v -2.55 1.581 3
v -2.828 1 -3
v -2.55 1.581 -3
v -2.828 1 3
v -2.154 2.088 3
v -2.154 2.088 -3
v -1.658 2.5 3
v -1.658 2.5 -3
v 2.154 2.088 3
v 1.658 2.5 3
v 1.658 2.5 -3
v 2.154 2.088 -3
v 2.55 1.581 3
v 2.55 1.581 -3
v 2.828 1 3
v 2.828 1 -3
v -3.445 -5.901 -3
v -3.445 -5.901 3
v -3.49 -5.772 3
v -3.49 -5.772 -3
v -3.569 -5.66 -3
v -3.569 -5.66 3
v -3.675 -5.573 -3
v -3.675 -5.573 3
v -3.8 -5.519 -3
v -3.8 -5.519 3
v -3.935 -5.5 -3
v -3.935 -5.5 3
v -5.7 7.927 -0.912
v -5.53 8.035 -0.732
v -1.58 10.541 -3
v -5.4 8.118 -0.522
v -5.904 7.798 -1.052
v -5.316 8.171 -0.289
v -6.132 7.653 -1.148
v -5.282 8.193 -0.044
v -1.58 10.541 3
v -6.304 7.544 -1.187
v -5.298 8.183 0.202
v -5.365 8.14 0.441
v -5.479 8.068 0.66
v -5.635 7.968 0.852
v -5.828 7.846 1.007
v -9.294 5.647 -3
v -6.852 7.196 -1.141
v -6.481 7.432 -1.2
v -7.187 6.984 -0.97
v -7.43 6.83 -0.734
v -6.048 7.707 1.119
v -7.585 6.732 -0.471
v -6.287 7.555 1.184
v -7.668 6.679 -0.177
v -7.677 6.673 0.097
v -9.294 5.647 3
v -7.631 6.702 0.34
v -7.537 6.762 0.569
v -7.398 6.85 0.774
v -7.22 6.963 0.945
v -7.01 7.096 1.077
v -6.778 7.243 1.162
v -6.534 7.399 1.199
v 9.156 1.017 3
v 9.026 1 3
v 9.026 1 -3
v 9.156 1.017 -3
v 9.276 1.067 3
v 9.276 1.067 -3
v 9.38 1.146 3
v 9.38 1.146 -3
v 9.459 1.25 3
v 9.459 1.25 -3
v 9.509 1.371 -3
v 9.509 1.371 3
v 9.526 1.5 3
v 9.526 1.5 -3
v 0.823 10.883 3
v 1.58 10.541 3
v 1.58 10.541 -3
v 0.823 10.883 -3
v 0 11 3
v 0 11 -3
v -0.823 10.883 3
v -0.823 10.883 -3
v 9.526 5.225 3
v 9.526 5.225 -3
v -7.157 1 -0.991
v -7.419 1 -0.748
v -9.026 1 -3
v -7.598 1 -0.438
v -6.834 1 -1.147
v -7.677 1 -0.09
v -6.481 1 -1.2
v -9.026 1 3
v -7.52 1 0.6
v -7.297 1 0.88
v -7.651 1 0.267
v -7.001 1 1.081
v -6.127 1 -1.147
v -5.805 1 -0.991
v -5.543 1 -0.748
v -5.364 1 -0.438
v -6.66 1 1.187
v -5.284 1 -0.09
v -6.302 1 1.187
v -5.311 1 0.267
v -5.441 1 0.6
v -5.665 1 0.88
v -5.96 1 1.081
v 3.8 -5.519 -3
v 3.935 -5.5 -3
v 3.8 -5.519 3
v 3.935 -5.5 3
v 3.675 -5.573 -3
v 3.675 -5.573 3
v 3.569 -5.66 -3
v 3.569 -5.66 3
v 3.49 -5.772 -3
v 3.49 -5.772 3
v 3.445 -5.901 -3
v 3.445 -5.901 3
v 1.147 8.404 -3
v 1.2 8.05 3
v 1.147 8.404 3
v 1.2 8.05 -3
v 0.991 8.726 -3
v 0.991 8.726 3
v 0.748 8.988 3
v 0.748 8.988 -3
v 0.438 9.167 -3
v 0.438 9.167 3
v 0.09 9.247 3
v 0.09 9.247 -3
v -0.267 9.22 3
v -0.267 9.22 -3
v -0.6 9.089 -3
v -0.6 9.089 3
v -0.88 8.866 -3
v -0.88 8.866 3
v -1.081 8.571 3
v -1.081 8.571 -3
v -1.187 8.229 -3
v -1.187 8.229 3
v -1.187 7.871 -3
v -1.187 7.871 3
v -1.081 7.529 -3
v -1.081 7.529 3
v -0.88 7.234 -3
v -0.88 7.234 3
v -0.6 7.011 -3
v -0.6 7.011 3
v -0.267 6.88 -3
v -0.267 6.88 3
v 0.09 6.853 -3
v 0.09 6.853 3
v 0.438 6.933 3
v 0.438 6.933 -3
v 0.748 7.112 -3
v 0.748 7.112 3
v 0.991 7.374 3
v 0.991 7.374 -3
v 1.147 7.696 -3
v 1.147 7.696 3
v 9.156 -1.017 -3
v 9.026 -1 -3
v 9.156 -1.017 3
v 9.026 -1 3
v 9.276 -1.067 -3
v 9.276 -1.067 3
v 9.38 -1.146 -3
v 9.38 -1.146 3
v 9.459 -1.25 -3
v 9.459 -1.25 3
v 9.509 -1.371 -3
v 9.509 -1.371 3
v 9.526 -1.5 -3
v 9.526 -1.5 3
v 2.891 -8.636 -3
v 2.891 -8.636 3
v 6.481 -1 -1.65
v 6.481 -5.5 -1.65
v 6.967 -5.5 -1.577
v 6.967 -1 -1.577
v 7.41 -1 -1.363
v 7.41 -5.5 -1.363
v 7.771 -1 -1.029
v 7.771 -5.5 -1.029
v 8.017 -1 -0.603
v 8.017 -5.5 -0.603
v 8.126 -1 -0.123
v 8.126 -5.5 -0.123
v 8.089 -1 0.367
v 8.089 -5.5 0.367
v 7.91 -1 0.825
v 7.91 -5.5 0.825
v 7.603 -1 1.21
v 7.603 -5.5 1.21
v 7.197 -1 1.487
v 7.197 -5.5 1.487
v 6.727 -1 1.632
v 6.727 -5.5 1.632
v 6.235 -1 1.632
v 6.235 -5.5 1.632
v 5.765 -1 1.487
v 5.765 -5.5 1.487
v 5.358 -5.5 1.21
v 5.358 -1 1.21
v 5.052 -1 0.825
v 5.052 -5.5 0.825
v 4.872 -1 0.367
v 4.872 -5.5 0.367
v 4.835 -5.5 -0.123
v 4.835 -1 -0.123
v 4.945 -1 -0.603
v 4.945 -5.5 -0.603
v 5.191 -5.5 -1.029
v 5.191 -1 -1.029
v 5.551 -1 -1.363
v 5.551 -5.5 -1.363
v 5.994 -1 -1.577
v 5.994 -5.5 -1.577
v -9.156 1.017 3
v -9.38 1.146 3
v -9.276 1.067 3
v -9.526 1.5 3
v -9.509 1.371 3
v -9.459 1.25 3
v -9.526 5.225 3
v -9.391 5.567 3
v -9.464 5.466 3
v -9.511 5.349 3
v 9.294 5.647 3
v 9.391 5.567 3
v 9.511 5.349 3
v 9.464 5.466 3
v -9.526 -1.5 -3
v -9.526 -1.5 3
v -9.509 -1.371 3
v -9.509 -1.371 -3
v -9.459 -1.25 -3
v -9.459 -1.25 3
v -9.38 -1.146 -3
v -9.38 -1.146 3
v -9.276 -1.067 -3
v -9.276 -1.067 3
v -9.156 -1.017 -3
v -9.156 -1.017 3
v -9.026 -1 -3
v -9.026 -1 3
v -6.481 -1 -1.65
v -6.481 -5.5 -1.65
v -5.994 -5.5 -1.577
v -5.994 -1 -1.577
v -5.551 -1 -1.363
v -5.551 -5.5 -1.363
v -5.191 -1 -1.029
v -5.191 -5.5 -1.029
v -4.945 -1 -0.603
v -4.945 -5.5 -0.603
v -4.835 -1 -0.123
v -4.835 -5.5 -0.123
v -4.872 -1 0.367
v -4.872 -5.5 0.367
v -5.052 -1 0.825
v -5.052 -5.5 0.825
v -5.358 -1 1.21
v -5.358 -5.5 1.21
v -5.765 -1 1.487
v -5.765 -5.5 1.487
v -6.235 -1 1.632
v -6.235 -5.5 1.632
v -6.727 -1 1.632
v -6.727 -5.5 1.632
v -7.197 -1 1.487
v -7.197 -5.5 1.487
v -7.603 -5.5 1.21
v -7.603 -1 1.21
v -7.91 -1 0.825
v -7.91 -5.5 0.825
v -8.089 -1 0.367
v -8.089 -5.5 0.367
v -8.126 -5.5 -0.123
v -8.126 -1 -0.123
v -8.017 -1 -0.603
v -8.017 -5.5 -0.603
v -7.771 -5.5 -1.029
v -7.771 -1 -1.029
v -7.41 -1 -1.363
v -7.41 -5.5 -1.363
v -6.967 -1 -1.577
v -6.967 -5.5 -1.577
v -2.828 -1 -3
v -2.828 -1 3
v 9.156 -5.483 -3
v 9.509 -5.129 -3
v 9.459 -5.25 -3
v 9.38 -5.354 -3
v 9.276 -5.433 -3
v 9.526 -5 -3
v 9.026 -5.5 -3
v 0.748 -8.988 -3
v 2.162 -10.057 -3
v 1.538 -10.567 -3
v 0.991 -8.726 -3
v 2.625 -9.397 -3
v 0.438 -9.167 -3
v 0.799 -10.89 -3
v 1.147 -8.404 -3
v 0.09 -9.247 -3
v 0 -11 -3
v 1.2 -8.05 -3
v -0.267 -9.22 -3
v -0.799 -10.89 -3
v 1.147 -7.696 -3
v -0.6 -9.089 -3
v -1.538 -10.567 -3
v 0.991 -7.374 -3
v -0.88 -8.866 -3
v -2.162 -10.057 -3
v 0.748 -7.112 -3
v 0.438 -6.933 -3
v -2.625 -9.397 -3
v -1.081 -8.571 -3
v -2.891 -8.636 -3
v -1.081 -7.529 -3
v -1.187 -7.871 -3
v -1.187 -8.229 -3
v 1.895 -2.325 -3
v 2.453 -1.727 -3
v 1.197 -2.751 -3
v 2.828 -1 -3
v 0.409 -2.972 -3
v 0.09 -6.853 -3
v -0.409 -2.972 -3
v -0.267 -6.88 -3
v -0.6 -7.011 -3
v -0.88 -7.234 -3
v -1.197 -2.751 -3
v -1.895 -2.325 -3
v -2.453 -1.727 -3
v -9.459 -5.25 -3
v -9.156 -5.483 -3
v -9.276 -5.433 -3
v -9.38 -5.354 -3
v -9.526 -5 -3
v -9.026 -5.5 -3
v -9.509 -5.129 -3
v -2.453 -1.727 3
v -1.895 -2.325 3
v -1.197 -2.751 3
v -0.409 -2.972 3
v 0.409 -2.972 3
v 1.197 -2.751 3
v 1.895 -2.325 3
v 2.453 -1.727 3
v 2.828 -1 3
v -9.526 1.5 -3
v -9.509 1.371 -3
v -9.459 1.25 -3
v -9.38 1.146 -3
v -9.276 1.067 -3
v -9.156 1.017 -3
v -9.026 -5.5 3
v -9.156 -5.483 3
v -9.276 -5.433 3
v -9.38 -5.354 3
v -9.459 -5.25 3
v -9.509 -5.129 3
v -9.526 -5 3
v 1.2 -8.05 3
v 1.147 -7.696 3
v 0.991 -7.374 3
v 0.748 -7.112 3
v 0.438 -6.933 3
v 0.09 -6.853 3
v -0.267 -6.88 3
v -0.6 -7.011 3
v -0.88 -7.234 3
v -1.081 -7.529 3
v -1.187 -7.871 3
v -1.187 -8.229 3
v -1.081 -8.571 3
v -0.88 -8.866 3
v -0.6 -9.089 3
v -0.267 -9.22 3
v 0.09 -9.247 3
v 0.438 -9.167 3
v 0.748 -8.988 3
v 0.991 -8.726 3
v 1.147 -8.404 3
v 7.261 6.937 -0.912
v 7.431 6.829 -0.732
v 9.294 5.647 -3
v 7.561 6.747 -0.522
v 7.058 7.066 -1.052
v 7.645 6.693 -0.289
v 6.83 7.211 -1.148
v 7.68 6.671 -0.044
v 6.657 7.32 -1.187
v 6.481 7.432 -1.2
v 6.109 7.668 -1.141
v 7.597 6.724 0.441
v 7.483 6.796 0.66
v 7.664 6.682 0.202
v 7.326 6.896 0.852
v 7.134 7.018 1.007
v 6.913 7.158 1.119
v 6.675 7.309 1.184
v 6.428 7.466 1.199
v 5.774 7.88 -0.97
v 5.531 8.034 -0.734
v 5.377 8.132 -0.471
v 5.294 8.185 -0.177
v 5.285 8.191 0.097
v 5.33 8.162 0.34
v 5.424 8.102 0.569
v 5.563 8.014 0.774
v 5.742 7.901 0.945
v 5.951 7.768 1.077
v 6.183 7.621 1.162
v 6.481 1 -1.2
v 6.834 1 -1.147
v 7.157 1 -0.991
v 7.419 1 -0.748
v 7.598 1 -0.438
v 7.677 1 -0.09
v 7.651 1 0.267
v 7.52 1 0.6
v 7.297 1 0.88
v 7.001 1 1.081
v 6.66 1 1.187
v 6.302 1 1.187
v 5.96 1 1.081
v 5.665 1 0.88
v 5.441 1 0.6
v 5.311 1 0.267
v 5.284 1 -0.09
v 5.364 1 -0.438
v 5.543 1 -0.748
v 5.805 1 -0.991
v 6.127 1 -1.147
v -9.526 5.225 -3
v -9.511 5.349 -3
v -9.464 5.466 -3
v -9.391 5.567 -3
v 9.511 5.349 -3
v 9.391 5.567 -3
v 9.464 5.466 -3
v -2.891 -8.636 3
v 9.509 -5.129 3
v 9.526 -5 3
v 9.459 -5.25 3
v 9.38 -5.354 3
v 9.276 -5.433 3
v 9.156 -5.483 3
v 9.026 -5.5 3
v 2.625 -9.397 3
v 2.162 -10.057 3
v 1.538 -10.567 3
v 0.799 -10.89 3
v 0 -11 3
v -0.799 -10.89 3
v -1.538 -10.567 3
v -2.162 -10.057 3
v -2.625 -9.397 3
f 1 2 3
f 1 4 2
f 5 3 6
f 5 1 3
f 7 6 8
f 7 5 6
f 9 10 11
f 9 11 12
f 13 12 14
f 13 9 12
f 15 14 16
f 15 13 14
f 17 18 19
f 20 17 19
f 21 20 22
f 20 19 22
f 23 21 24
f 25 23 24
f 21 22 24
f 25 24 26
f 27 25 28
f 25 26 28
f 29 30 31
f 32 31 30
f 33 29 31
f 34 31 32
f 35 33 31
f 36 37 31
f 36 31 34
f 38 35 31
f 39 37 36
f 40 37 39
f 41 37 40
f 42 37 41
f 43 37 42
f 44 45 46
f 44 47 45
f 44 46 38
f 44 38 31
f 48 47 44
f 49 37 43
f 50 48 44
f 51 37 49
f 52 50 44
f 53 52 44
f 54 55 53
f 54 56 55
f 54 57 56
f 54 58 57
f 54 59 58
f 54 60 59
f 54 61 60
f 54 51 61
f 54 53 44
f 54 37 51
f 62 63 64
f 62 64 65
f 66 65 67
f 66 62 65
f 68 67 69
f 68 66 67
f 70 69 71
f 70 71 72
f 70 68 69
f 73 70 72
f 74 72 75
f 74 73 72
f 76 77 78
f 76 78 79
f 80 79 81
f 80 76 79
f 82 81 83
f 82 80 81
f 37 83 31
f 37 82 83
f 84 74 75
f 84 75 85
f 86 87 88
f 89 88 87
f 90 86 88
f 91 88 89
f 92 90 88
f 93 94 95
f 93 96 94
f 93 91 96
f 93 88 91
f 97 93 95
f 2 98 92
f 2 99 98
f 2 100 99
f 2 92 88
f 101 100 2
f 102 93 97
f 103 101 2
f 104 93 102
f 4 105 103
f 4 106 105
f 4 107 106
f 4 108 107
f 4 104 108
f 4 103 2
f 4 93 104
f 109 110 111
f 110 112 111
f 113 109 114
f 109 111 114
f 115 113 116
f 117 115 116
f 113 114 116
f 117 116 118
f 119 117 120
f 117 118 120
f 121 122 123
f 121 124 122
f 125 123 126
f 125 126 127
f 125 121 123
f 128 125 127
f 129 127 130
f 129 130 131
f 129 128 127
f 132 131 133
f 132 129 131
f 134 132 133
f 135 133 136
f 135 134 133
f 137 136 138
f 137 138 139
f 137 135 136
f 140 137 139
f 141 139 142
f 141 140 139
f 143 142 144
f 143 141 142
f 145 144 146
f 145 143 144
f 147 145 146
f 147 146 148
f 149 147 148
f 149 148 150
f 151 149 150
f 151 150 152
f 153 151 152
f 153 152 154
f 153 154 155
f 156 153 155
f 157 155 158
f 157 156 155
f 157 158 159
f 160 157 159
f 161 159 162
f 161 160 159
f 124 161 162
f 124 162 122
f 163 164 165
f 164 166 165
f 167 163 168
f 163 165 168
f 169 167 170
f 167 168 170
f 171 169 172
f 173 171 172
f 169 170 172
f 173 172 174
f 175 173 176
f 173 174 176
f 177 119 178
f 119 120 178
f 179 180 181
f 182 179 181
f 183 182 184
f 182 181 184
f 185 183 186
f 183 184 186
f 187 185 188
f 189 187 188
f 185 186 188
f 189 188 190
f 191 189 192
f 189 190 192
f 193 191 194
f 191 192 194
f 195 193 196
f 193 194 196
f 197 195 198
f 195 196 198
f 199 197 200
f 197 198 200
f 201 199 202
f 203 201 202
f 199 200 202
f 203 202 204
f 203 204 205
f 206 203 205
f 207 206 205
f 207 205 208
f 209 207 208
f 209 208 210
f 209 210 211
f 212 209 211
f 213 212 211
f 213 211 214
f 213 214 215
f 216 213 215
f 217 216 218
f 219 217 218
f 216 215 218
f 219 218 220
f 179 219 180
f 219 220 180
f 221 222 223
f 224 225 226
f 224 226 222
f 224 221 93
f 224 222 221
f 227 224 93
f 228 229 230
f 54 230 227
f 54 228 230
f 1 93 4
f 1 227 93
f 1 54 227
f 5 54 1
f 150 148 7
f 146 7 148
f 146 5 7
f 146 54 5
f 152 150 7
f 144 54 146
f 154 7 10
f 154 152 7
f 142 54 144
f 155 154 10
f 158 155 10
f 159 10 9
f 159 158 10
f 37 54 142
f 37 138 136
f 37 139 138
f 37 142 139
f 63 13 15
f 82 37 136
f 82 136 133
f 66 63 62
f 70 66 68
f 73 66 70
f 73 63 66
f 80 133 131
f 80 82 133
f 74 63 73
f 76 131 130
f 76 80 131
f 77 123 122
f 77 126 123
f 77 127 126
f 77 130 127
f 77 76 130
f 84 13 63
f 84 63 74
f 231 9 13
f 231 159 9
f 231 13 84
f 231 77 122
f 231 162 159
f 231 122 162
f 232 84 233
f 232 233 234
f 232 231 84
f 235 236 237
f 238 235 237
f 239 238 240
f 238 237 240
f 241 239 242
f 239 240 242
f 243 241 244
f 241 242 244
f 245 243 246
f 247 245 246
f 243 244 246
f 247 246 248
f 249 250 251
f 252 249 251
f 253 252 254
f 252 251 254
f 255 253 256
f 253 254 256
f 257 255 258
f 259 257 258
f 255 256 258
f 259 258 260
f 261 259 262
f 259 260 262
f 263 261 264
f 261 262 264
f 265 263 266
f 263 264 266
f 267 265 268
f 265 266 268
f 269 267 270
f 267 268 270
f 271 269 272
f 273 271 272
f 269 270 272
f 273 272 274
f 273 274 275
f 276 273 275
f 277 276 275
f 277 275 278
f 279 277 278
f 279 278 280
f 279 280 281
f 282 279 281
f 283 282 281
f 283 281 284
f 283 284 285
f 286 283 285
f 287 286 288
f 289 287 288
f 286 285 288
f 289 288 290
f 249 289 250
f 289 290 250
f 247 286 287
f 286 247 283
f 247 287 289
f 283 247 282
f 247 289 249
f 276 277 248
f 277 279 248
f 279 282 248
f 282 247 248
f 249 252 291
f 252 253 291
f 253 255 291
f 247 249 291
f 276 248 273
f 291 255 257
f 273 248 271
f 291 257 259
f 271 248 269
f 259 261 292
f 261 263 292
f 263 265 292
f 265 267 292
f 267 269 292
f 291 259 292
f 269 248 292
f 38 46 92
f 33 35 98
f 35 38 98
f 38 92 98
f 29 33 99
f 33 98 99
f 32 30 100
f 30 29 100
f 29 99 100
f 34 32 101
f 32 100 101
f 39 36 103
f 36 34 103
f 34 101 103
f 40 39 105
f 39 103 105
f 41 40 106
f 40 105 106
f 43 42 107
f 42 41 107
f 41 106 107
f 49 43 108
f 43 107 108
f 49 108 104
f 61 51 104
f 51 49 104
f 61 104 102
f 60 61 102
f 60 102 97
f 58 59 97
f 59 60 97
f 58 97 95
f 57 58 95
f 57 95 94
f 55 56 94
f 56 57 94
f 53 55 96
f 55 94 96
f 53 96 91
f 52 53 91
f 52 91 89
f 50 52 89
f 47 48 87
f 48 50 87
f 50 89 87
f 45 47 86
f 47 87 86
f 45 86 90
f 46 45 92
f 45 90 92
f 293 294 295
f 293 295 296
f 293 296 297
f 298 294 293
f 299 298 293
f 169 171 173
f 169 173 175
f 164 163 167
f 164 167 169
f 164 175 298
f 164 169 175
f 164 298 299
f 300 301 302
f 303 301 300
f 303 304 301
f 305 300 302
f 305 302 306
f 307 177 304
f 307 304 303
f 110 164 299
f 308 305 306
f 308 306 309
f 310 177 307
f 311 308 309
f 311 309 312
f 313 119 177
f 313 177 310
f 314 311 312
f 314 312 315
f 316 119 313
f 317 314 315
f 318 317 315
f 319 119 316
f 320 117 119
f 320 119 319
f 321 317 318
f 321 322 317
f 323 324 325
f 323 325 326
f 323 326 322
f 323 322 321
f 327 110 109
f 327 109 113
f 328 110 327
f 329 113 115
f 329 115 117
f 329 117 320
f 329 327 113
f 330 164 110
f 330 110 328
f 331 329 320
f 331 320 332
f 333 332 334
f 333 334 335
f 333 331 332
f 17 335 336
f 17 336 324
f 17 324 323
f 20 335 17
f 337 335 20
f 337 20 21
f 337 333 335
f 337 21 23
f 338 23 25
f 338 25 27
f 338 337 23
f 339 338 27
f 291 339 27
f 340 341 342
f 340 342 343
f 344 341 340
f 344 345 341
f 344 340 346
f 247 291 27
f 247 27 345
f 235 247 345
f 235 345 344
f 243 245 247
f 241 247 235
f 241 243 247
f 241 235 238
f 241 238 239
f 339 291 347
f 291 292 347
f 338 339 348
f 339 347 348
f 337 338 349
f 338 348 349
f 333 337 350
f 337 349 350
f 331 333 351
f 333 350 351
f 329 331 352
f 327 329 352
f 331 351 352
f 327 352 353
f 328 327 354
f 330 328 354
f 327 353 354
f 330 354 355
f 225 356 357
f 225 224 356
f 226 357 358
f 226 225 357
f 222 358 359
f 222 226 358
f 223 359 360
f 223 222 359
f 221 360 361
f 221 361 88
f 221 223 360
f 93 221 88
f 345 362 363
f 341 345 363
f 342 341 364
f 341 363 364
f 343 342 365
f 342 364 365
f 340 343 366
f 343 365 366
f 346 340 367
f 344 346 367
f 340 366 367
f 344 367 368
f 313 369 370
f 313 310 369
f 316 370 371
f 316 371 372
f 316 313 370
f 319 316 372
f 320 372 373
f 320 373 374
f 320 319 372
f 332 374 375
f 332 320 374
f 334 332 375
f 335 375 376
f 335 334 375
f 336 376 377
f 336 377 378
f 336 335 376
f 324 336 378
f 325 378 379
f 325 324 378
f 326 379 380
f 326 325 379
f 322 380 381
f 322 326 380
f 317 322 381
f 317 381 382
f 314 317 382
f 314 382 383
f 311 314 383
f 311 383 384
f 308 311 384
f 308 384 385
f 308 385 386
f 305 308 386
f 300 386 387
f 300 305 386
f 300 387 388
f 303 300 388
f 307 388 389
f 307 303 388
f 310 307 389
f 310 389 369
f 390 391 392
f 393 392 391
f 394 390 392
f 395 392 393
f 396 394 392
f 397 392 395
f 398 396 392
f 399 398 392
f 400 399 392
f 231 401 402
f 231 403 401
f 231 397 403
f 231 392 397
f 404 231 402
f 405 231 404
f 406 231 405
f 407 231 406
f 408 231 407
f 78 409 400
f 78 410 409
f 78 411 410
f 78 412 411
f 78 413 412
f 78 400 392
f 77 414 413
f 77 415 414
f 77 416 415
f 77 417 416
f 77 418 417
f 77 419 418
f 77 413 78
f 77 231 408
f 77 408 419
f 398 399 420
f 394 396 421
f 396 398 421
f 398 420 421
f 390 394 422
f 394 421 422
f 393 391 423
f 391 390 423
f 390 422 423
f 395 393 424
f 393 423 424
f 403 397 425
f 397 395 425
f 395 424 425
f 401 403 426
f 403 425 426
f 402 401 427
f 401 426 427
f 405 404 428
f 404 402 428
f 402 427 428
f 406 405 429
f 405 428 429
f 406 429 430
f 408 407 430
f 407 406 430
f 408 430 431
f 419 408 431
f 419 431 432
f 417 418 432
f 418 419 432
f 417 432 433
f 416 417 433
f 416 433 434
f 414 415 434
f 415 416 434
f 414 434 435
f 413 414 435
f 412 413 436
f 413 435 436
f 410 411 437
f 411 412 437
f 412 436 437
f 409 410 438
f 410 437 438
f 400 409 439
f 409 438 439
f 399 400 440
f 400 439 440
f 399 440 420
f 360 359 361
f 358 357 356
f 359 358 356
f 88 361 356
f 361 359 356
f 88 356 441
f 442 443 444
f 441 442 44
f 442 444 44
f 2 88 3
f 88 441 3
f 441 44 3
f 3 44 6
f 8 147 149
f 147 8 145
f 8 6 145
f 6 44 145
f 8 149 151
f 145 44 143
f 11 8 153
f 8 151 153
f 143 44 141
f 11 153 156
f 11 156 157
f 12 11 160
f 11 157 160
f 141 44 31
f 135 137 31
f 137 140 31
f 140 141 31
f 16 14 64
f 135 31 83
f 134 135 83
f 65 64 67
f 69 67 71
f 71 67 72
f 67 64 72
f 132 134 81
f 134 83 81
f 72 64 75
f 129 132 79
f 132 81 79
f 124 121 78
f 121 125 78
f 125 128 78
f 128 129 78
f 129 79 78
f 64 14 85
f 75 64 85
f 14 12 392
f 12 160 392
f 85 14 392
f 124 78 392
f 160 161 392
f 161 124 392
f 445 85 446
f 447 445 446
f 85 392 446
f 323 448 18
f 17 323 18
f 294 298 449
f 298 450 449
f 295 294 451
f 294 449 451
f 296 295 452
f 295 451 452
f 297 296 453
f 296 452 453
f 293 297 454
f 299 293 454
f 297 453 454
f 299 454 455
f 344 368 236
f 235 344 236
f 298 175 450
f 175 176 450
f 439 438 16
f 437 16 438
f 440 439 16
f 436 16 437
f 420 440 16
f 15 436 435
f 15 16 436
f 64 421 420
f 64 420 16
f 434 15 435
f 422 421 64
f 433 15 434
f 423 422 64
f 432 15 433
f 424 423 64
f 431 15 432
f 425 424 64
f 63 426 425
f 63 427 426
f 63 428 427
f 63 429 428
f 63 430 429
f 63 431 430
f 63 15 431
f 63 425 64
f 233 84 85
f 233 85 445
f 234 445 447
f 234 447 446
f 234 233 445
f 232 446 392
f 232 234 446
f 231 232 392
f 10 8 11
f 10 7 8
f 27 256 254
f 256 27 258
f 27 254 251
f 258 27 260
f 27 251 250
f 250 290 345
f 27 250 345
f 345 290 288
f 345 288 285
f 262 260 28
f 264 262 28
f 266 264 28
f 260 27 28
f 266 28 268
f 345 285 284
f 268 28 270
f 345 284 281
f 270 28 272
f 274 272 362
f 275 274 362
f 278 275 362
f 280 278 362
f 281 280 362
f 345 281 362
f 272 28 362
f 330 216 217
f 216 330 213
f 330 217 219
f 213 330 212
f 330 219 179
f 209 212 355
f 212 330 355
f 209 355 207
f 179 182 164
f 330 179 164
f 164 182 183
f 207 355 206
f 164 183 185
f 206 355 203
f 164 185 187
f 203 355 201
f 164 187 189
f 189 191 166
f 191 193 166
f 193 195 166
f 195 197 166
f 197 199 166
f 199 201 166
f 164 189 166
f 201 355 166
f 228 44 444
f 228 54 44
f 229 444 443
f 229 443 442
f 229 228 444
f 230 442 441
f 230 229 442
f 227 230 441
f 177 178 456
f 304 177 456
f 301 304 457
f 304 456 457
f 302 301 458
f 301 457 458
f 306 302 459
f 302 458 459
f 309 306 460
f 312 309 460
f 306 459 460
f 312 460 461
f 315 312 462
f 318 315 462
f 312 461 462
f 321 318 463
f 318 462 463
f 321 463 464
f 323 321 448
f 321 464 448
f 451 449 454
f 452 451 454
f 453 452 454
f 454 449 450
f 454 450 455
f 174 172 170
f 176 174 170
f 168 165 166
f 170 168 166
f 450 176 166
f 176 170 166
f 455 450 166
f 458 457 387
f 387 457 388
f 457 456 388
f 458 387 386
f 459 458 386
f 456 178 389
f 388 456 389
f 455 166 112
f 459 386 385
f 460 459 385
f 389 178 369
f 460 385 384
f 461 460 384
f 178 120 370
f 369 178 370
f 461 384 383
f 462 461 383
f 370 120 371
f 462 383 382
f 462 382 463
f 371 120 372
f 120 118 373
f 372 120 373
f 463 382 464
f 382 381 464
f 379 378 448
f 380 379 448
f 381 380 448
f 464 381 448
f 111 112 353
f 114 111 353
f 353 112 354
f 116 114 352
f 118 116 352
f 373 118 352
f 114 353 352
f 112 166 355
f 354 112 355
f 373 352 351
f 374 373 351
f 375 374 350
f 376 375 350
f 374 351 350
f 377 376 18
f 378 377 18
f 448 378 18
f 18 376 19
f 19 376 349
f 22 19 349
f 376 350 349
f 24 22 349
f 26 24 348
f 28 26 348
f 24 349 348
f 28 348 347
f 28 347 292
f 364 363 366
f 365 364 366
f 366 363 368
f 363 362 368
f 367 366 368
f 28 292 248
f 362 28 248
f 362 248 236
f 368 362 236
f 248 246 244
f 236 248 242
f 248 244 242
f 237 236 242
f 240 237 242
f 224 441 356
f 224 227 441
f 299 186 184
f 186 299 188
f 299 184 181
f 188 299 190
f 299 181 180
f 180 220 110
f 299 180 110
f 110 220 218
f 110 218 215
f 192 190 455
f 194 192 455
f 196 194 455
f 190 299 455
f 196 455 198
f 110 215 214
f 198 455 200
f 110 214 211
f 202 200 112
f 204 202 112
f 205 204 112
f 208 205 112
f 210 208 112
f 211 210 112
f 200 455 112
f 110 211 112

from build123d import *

# Parameters (mm, degrees)
SKETCH_1_R          = 1.2
EXTRUDE_1_DEPTH     = 3
EXTRUDE_1_2_DEPTH   = 3
SKETCH_2_R          = 1.2
CUT_EXTRUDE_1_DEPTH = 20.287301522
SKETCH_3_R          = 1.65
CUT_EXTRUDE_2_DEPTH = 4.5


with BuildPart() as part:
    # 草图1 → 凸台-拉伸1 (new, symmetric)
    with BuildSketch(Plane.XY):
        with BuildLine():
            Line((-1.658312395, 2.5), (1.658312395, 2.5))
            ThreePointArc((1.658312395, 2.5), (2.365419176, 1.84520788), (2.828427125, 1))
            Line((2.828427125, 1), (9.026279442, 1))
            ThreePointArc((9.026279442, 1), (9.379832832, 1.146446609), (9.526279442, 1.5))
            Line((9.526279442, 1.5), (9.526279442, 5.22507425))
            ThreePointArc((9.526279442, 5.22507425), (9.464414867, 5.465983671), (9.294130046, 5.647278056))
            Line((9.294130046, 5.647278056), (1.580318565, 10.541002455))
            ThreePointArc((1.580318565, 10.541002455), (0, 11), (-1.580318565, 10.541002455))
            Line((-1.580318565, 10.541002455), (-9.294130046, 5.647278056))
            ThreePointArc((-9.294130046, 5.647278056), (-9.464414867, 5.465983671), (-9.526279442, 5.22507425))
            Line((-9.526279442, 5.22507425), (-9.526279442, 1.5))
            ThreePointArc((-9.526279442, 1.5), (-9.379832832, 1.146446609), (-9.026279442, 1))
            Line((-9.026279442, 1), (-2.828427125, 1))
            ThreePointArc((-2.828427125, 1), (-2.365419176, 1.84520788), (-1.658312395, 2.5))
        make_face()
        with Locations((0, 8.05)):
            Circle(SKETCH_1_R, mode=Mode.SUBTRACT)
    extrude(amount=EXTRUDE_1_DEPTH, both=True)


with BuildPart() as body_2:
    # 草图1 → Extrude 1 2 (new, symmetric)
    with BuildSketch(Plane.XY):
        with BuildLine():
            Line((-9.026279442, -1), (-2.828427125, -1))
            ThreePointArc((-2.828427125, -1), (0, -3), (2.828427125, -1))
            Line((2.828427125, -1), (9.026279442, -1))
            ThreePointArc((9.026279442, -1), (9.379832832, -1.146446609), (9.526279442, -1.5))
            Line((9.526279442, -1.5), (9.526279442, -5))
            ThreePointArc((9.526279442, -5), (9.379832832, -5.353553391), (9.026279442, -5.5))
            Line((9.026279442, -5.5), (3.935174447, -5.5))
            ThreePointArc((3.935174447, -5.5), (3.6186464, -5.612947037), (3.445121974, -5.900760016))
            Line((3.445121974, -5.900760016), (2.891309587, -8.635515904))
            ThreePointArc((2.891309587, -8.635515904), (0, -11), (-2.891309587, -8.635515904))
            Line((-2.891309587, -8.635515904), (-3.445121974, -5.900760016))
            ThreePointArc((-3.445121974, -5.900760016), (-3.6186464, -5.612947037), (-3.935174447, -5.5))
            Line((-3.935174447, -5.5), (-9.026279442, -5.5))
            ThreePointArc((-9.026279442, -5.5), (-9.379832832, -5.353553391), (-9.526279442, -5))
            Line((-9.526279442, -5), (-9.526279442, -1.5))
            ThreePointArc((-9.526279442, -1.5), (-9.379832832, -1.146446609), (-9.026279442, -1))
        make_face()
        with Locations((0, -8.05)):
            Circle(SKETCH_1_R, mode=Mode.SUBTRACT)
    extrude(amount=EXTRUDE_1_2_DEPTH, both=True)


with BuildPart() as cut_extrude_1_tool:
    # 草图2 → 切除-拉伸1 (new, through all)
    with BuildSketch(Plane.XZ.offset(5.5)):
        with Locations(Location((6.480726944, 0, 0), (0, 0, 270))):
            Circle(SKETCH_2_R)
        with Locations(Location((-6.480726944, 0, 0), (0, 0, 270))):
            Circle(SKETCH_2_R)
    extrude(amount=-CUT_EXTRUDE_1_DEPTH)


with BuildPart() as part_1:
    add(part.part)

    # 切除-拉伸1: cut by cut_extrude_1_tool
    add(cut_extrude_1_tool.part, mode=Mode.SUBTRACT)


with BuildPart() as body_2_1:
    add(body_2.part)

    # 切除-拉伸1: cut by cut_extrude_1_tool
    add(cut_extrude_1_tool.part, mode=Mode.SUBTRACT)

    # 草图3 → 切除-拉伸2 (cut)
    with BuildSketch(Plane.XZ.offset(5.5)):
        with Locations(Location((-6.480726944, 0, 0), (0, 0, 270))):
            Circle(SKETCH_3_R)
        with Locations(Location((6.480726944, 0, 0), (0, 0, 270))):
            Circle(SKETCH_3_R)
    extrude(amount=-CUT_EXTRUDE_2_DEPTH, mode=Mode.SUBTRACT)


solid = Compound([part_1.part, body_2_1.part])
